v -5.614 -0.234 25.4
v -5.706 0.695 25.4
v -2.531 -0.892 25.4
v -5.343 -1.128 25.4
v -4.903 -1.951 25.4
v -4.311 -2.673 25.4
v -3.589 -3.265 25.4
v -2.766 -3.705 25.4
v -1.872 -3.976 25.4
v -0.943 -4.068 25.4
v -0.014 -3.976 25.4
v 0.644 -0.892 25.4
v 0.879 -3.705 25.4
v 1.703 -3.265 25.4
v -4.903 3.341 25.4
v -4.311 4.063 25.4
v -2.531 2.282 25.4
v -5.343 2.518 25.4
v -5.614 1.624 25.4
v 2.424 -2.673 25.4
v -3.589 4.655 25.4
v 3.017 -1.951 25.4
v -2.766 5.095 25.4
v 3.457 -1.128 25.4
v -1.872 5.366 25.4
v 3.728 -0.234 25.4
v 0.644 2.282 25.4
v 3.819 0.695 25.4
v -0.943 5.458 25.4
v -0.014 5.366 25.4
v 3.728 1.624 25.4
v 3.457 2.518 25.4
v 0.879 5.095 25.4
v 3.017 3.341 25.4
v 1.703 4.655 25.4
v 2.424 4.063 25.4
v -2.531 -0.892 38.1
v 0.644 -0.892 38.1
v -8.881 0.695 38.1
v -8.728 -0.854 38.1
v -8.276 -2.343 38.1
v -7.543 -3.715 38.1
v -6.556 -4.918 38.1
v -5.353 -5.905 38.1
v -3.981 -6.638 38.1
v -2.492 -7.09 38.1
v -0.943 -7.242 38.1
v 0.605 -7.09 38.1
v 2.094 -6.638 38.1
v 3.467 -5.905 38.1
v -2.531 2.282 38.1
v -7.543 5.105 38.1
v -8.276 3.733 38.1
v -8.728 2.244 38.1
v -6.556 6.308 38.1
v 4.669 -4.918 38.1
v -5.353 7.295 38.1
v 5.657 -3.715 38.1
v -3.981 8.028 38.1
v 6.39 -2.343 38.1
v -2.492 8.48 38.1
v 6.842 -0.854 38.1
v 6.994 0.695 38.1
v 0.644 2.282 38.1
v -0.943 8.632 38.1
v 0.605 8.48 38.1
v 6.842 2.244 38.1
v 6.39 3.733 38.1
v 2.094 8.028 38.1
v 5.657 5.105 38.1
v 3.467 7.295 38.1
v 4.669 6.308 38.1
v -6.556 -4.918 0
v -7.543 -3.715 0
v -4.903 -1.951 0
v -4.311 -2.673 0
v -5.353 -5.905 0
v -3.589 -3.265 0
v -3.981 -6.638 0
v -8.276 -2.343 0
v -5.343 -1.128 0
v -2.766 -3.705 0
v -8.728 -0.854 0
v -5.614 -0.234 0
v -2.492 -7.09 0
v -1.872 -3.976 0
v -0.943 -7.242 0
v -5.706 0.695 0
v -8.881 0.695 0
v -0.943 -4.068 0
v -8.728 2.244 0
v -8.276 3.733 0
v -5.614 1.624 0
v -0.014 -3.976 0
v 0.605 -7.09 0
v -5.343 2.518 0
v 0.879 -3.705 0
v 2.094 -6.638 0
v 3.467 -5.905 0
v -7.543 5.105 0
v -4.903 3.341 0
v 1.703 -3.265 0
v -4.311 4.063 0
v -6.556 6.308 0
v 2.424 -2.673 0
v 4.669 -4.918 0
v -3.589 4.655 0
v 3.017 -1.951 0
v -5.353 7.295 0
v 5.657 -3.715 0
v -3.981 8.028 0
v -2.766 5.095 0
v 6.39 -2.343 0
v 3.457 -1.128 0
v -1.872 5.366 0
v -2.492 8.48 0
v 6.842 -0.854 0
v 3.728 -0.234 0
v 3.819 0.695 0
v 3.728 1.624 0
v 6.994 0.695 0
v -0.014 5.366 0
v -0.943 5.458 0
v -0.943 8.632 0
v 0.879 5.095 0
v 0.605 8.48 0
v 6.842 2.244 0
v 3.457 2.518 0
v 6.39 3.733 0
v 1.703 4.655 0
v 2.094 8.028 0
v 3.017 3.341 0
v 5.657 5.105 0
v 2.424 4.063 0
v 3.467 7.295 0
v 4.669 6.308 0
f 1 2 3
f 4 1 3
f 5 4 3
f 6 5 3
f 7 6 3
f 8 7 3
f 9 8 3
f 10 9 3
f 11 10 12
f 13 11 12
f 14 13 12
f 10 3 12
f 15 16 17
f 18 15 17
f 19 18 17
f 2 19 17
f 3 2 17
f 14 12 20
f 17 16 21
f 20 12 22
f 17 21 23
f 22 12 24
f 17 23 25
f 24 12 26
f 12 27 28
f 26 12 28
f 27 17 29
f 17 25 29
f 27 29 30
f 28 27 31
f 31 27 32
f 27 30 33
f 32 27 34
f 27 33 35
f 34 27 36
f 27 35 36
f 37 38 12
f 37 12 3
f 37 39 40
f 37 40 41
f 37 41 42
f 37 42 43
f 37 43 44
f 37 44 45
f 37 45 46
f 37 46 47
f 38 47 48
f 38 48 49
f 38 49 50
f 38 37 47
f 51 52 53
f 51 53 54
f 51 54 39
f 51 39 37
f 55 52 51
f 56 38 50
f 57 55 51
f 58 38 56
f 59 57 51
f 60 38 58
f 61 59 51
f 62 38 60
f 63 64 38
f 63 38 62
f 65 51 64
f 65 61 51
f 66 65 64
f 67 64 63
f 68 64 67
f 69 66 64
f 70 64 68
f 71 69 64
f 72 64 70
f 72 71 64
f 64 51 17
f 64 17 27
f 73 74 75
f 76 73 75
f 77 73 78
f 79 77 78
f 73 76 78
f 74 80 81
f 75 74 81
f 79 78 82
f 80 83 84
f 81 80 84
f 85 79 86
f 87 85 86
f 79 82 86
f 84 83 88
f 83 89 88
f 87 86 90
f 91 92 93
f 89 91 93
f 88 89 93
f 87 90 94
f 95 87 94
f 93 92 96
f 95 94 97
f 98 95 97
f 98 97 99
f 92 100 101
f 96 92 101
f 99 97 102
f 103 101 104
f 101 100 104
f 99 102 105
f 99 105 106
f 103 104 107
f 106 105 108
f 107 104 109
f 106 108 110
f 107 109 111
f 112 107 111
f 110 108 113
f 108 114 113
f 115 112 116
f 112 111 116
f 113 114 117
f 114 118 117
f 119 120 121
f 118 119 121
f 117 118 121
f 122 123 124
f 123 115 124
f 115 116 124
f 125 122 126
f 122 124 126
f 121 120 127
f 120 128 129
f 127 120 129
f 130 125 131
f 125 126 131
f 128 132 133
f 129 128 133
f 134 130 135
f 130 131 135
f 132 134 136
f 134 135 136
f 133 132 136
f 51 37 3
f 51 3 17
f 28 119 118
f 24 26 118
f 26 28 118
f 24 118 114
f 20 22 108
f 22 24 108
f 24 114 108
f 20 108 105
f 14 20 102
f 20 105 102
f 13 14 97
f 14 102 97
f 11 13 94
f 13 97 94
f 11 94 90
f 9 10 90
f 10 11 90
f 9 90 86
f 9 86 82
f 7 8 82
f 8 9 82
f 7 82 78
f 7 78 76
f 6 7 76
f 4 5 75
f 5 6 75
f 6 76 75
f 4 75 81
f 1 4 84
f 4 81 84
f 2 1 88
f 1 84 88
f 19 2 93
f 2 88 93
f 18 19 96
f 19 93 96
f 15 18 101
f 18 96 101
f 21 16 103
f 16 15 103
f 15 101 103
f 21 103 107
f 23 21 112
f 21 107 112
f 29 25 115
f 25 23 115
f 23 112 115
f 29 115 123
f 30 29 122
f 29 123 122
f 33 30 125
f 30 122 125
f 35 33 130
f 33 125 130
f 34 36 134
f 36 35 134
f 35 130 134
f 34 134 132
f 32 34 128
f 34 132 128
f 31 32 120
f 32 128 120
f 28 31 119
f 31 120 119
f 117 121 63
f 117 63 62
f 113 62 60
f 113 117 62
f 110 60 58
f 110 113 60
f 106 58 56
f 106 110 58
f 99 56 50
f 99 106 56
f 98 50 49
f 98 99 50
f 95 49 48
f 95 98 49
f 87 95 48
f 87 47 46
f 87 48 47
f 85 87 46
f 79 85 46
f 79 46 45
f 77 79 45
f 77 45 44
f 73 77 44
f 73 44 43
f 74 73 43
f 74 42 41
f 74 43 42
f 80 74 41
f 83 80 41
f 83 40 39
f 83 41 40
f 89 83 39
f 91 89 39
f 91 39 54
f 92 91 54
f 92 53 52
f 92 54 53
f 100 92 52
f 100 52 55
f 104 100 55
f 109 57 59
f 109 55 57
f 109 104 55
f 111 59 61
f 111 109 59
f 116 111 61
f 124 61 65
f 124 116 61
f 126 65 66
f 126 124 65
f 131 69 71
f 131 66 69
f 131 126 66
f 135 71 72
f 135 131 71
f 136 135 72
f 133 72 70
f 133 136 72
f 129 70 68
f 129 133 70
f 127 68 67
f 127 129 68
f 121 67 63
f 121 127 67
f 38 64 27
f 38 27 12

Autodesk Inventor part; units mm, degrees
ref_plane "YZ Plane" through (0, 0, 0) normal (1, 0, 0) x (0, 1, 0)
ref_plane "XZ Plane" through (0, 0, 0) normal (0, 1, 0) x (-1, 0, 0)
ref_plane "XY Plane" through (0, 0, 0) normal (0, 0, 1) x (1, 0, 0)
sketch "Sketch1" plane through (0, 0, 0) normal (0, 0, 1) x (1, 0, 0)
  circle A0 centre (-0.9432, 0.695) radius 7.9375
  circle A1 centre (-0.9432, 0.695) radius 4.7625
  dimension "d0" = 9.525
  dimension "d1" = 15.875
extrude "Extrusion1" add sketch "Sketch1" along normal blind 25.4
sketch "Sketch3" plane through (-0.9432, 0.695, 25.4) normal (0, 0, 1) x (1, 0, 0)
  circle A0 centre (0, 0) radius 7.9375 projected
  circle A1 centre (0, 0) radius 7.9375
extrude "Extrusion2" add sketch "Sketch3" along normal blind 12.7
sketch "Sketch5" plane through (-0.9432, 0.695, 38.1) normal (0, 0, 1) x (1, 0, 0)
  circle A0 centre (0, 0) radius 7.9375 projected
  line L0 (-1.5875, 1.5875) -> (1.5875, 1.5875)
  line L1 (1.5875, 1.5875) -> (1.5875, -1.5875)
  line L2 (1.5875, -1.5875) -> (-1.5875, -1.5875)
  line L3 (-1.5875, -1.5875) -> (-1.5875, 1.5875)
  point P0 (0, -1.5875)
  point P1 (1.5875, 0)
  dimension "d6" = 3.175
extrude "Extrusion3" cut sketch "Sketch5" against normal up to surface (12.7 mm away) contours L0 L1 L2 L3
properties part number "VEX Encoder shaft converter"
